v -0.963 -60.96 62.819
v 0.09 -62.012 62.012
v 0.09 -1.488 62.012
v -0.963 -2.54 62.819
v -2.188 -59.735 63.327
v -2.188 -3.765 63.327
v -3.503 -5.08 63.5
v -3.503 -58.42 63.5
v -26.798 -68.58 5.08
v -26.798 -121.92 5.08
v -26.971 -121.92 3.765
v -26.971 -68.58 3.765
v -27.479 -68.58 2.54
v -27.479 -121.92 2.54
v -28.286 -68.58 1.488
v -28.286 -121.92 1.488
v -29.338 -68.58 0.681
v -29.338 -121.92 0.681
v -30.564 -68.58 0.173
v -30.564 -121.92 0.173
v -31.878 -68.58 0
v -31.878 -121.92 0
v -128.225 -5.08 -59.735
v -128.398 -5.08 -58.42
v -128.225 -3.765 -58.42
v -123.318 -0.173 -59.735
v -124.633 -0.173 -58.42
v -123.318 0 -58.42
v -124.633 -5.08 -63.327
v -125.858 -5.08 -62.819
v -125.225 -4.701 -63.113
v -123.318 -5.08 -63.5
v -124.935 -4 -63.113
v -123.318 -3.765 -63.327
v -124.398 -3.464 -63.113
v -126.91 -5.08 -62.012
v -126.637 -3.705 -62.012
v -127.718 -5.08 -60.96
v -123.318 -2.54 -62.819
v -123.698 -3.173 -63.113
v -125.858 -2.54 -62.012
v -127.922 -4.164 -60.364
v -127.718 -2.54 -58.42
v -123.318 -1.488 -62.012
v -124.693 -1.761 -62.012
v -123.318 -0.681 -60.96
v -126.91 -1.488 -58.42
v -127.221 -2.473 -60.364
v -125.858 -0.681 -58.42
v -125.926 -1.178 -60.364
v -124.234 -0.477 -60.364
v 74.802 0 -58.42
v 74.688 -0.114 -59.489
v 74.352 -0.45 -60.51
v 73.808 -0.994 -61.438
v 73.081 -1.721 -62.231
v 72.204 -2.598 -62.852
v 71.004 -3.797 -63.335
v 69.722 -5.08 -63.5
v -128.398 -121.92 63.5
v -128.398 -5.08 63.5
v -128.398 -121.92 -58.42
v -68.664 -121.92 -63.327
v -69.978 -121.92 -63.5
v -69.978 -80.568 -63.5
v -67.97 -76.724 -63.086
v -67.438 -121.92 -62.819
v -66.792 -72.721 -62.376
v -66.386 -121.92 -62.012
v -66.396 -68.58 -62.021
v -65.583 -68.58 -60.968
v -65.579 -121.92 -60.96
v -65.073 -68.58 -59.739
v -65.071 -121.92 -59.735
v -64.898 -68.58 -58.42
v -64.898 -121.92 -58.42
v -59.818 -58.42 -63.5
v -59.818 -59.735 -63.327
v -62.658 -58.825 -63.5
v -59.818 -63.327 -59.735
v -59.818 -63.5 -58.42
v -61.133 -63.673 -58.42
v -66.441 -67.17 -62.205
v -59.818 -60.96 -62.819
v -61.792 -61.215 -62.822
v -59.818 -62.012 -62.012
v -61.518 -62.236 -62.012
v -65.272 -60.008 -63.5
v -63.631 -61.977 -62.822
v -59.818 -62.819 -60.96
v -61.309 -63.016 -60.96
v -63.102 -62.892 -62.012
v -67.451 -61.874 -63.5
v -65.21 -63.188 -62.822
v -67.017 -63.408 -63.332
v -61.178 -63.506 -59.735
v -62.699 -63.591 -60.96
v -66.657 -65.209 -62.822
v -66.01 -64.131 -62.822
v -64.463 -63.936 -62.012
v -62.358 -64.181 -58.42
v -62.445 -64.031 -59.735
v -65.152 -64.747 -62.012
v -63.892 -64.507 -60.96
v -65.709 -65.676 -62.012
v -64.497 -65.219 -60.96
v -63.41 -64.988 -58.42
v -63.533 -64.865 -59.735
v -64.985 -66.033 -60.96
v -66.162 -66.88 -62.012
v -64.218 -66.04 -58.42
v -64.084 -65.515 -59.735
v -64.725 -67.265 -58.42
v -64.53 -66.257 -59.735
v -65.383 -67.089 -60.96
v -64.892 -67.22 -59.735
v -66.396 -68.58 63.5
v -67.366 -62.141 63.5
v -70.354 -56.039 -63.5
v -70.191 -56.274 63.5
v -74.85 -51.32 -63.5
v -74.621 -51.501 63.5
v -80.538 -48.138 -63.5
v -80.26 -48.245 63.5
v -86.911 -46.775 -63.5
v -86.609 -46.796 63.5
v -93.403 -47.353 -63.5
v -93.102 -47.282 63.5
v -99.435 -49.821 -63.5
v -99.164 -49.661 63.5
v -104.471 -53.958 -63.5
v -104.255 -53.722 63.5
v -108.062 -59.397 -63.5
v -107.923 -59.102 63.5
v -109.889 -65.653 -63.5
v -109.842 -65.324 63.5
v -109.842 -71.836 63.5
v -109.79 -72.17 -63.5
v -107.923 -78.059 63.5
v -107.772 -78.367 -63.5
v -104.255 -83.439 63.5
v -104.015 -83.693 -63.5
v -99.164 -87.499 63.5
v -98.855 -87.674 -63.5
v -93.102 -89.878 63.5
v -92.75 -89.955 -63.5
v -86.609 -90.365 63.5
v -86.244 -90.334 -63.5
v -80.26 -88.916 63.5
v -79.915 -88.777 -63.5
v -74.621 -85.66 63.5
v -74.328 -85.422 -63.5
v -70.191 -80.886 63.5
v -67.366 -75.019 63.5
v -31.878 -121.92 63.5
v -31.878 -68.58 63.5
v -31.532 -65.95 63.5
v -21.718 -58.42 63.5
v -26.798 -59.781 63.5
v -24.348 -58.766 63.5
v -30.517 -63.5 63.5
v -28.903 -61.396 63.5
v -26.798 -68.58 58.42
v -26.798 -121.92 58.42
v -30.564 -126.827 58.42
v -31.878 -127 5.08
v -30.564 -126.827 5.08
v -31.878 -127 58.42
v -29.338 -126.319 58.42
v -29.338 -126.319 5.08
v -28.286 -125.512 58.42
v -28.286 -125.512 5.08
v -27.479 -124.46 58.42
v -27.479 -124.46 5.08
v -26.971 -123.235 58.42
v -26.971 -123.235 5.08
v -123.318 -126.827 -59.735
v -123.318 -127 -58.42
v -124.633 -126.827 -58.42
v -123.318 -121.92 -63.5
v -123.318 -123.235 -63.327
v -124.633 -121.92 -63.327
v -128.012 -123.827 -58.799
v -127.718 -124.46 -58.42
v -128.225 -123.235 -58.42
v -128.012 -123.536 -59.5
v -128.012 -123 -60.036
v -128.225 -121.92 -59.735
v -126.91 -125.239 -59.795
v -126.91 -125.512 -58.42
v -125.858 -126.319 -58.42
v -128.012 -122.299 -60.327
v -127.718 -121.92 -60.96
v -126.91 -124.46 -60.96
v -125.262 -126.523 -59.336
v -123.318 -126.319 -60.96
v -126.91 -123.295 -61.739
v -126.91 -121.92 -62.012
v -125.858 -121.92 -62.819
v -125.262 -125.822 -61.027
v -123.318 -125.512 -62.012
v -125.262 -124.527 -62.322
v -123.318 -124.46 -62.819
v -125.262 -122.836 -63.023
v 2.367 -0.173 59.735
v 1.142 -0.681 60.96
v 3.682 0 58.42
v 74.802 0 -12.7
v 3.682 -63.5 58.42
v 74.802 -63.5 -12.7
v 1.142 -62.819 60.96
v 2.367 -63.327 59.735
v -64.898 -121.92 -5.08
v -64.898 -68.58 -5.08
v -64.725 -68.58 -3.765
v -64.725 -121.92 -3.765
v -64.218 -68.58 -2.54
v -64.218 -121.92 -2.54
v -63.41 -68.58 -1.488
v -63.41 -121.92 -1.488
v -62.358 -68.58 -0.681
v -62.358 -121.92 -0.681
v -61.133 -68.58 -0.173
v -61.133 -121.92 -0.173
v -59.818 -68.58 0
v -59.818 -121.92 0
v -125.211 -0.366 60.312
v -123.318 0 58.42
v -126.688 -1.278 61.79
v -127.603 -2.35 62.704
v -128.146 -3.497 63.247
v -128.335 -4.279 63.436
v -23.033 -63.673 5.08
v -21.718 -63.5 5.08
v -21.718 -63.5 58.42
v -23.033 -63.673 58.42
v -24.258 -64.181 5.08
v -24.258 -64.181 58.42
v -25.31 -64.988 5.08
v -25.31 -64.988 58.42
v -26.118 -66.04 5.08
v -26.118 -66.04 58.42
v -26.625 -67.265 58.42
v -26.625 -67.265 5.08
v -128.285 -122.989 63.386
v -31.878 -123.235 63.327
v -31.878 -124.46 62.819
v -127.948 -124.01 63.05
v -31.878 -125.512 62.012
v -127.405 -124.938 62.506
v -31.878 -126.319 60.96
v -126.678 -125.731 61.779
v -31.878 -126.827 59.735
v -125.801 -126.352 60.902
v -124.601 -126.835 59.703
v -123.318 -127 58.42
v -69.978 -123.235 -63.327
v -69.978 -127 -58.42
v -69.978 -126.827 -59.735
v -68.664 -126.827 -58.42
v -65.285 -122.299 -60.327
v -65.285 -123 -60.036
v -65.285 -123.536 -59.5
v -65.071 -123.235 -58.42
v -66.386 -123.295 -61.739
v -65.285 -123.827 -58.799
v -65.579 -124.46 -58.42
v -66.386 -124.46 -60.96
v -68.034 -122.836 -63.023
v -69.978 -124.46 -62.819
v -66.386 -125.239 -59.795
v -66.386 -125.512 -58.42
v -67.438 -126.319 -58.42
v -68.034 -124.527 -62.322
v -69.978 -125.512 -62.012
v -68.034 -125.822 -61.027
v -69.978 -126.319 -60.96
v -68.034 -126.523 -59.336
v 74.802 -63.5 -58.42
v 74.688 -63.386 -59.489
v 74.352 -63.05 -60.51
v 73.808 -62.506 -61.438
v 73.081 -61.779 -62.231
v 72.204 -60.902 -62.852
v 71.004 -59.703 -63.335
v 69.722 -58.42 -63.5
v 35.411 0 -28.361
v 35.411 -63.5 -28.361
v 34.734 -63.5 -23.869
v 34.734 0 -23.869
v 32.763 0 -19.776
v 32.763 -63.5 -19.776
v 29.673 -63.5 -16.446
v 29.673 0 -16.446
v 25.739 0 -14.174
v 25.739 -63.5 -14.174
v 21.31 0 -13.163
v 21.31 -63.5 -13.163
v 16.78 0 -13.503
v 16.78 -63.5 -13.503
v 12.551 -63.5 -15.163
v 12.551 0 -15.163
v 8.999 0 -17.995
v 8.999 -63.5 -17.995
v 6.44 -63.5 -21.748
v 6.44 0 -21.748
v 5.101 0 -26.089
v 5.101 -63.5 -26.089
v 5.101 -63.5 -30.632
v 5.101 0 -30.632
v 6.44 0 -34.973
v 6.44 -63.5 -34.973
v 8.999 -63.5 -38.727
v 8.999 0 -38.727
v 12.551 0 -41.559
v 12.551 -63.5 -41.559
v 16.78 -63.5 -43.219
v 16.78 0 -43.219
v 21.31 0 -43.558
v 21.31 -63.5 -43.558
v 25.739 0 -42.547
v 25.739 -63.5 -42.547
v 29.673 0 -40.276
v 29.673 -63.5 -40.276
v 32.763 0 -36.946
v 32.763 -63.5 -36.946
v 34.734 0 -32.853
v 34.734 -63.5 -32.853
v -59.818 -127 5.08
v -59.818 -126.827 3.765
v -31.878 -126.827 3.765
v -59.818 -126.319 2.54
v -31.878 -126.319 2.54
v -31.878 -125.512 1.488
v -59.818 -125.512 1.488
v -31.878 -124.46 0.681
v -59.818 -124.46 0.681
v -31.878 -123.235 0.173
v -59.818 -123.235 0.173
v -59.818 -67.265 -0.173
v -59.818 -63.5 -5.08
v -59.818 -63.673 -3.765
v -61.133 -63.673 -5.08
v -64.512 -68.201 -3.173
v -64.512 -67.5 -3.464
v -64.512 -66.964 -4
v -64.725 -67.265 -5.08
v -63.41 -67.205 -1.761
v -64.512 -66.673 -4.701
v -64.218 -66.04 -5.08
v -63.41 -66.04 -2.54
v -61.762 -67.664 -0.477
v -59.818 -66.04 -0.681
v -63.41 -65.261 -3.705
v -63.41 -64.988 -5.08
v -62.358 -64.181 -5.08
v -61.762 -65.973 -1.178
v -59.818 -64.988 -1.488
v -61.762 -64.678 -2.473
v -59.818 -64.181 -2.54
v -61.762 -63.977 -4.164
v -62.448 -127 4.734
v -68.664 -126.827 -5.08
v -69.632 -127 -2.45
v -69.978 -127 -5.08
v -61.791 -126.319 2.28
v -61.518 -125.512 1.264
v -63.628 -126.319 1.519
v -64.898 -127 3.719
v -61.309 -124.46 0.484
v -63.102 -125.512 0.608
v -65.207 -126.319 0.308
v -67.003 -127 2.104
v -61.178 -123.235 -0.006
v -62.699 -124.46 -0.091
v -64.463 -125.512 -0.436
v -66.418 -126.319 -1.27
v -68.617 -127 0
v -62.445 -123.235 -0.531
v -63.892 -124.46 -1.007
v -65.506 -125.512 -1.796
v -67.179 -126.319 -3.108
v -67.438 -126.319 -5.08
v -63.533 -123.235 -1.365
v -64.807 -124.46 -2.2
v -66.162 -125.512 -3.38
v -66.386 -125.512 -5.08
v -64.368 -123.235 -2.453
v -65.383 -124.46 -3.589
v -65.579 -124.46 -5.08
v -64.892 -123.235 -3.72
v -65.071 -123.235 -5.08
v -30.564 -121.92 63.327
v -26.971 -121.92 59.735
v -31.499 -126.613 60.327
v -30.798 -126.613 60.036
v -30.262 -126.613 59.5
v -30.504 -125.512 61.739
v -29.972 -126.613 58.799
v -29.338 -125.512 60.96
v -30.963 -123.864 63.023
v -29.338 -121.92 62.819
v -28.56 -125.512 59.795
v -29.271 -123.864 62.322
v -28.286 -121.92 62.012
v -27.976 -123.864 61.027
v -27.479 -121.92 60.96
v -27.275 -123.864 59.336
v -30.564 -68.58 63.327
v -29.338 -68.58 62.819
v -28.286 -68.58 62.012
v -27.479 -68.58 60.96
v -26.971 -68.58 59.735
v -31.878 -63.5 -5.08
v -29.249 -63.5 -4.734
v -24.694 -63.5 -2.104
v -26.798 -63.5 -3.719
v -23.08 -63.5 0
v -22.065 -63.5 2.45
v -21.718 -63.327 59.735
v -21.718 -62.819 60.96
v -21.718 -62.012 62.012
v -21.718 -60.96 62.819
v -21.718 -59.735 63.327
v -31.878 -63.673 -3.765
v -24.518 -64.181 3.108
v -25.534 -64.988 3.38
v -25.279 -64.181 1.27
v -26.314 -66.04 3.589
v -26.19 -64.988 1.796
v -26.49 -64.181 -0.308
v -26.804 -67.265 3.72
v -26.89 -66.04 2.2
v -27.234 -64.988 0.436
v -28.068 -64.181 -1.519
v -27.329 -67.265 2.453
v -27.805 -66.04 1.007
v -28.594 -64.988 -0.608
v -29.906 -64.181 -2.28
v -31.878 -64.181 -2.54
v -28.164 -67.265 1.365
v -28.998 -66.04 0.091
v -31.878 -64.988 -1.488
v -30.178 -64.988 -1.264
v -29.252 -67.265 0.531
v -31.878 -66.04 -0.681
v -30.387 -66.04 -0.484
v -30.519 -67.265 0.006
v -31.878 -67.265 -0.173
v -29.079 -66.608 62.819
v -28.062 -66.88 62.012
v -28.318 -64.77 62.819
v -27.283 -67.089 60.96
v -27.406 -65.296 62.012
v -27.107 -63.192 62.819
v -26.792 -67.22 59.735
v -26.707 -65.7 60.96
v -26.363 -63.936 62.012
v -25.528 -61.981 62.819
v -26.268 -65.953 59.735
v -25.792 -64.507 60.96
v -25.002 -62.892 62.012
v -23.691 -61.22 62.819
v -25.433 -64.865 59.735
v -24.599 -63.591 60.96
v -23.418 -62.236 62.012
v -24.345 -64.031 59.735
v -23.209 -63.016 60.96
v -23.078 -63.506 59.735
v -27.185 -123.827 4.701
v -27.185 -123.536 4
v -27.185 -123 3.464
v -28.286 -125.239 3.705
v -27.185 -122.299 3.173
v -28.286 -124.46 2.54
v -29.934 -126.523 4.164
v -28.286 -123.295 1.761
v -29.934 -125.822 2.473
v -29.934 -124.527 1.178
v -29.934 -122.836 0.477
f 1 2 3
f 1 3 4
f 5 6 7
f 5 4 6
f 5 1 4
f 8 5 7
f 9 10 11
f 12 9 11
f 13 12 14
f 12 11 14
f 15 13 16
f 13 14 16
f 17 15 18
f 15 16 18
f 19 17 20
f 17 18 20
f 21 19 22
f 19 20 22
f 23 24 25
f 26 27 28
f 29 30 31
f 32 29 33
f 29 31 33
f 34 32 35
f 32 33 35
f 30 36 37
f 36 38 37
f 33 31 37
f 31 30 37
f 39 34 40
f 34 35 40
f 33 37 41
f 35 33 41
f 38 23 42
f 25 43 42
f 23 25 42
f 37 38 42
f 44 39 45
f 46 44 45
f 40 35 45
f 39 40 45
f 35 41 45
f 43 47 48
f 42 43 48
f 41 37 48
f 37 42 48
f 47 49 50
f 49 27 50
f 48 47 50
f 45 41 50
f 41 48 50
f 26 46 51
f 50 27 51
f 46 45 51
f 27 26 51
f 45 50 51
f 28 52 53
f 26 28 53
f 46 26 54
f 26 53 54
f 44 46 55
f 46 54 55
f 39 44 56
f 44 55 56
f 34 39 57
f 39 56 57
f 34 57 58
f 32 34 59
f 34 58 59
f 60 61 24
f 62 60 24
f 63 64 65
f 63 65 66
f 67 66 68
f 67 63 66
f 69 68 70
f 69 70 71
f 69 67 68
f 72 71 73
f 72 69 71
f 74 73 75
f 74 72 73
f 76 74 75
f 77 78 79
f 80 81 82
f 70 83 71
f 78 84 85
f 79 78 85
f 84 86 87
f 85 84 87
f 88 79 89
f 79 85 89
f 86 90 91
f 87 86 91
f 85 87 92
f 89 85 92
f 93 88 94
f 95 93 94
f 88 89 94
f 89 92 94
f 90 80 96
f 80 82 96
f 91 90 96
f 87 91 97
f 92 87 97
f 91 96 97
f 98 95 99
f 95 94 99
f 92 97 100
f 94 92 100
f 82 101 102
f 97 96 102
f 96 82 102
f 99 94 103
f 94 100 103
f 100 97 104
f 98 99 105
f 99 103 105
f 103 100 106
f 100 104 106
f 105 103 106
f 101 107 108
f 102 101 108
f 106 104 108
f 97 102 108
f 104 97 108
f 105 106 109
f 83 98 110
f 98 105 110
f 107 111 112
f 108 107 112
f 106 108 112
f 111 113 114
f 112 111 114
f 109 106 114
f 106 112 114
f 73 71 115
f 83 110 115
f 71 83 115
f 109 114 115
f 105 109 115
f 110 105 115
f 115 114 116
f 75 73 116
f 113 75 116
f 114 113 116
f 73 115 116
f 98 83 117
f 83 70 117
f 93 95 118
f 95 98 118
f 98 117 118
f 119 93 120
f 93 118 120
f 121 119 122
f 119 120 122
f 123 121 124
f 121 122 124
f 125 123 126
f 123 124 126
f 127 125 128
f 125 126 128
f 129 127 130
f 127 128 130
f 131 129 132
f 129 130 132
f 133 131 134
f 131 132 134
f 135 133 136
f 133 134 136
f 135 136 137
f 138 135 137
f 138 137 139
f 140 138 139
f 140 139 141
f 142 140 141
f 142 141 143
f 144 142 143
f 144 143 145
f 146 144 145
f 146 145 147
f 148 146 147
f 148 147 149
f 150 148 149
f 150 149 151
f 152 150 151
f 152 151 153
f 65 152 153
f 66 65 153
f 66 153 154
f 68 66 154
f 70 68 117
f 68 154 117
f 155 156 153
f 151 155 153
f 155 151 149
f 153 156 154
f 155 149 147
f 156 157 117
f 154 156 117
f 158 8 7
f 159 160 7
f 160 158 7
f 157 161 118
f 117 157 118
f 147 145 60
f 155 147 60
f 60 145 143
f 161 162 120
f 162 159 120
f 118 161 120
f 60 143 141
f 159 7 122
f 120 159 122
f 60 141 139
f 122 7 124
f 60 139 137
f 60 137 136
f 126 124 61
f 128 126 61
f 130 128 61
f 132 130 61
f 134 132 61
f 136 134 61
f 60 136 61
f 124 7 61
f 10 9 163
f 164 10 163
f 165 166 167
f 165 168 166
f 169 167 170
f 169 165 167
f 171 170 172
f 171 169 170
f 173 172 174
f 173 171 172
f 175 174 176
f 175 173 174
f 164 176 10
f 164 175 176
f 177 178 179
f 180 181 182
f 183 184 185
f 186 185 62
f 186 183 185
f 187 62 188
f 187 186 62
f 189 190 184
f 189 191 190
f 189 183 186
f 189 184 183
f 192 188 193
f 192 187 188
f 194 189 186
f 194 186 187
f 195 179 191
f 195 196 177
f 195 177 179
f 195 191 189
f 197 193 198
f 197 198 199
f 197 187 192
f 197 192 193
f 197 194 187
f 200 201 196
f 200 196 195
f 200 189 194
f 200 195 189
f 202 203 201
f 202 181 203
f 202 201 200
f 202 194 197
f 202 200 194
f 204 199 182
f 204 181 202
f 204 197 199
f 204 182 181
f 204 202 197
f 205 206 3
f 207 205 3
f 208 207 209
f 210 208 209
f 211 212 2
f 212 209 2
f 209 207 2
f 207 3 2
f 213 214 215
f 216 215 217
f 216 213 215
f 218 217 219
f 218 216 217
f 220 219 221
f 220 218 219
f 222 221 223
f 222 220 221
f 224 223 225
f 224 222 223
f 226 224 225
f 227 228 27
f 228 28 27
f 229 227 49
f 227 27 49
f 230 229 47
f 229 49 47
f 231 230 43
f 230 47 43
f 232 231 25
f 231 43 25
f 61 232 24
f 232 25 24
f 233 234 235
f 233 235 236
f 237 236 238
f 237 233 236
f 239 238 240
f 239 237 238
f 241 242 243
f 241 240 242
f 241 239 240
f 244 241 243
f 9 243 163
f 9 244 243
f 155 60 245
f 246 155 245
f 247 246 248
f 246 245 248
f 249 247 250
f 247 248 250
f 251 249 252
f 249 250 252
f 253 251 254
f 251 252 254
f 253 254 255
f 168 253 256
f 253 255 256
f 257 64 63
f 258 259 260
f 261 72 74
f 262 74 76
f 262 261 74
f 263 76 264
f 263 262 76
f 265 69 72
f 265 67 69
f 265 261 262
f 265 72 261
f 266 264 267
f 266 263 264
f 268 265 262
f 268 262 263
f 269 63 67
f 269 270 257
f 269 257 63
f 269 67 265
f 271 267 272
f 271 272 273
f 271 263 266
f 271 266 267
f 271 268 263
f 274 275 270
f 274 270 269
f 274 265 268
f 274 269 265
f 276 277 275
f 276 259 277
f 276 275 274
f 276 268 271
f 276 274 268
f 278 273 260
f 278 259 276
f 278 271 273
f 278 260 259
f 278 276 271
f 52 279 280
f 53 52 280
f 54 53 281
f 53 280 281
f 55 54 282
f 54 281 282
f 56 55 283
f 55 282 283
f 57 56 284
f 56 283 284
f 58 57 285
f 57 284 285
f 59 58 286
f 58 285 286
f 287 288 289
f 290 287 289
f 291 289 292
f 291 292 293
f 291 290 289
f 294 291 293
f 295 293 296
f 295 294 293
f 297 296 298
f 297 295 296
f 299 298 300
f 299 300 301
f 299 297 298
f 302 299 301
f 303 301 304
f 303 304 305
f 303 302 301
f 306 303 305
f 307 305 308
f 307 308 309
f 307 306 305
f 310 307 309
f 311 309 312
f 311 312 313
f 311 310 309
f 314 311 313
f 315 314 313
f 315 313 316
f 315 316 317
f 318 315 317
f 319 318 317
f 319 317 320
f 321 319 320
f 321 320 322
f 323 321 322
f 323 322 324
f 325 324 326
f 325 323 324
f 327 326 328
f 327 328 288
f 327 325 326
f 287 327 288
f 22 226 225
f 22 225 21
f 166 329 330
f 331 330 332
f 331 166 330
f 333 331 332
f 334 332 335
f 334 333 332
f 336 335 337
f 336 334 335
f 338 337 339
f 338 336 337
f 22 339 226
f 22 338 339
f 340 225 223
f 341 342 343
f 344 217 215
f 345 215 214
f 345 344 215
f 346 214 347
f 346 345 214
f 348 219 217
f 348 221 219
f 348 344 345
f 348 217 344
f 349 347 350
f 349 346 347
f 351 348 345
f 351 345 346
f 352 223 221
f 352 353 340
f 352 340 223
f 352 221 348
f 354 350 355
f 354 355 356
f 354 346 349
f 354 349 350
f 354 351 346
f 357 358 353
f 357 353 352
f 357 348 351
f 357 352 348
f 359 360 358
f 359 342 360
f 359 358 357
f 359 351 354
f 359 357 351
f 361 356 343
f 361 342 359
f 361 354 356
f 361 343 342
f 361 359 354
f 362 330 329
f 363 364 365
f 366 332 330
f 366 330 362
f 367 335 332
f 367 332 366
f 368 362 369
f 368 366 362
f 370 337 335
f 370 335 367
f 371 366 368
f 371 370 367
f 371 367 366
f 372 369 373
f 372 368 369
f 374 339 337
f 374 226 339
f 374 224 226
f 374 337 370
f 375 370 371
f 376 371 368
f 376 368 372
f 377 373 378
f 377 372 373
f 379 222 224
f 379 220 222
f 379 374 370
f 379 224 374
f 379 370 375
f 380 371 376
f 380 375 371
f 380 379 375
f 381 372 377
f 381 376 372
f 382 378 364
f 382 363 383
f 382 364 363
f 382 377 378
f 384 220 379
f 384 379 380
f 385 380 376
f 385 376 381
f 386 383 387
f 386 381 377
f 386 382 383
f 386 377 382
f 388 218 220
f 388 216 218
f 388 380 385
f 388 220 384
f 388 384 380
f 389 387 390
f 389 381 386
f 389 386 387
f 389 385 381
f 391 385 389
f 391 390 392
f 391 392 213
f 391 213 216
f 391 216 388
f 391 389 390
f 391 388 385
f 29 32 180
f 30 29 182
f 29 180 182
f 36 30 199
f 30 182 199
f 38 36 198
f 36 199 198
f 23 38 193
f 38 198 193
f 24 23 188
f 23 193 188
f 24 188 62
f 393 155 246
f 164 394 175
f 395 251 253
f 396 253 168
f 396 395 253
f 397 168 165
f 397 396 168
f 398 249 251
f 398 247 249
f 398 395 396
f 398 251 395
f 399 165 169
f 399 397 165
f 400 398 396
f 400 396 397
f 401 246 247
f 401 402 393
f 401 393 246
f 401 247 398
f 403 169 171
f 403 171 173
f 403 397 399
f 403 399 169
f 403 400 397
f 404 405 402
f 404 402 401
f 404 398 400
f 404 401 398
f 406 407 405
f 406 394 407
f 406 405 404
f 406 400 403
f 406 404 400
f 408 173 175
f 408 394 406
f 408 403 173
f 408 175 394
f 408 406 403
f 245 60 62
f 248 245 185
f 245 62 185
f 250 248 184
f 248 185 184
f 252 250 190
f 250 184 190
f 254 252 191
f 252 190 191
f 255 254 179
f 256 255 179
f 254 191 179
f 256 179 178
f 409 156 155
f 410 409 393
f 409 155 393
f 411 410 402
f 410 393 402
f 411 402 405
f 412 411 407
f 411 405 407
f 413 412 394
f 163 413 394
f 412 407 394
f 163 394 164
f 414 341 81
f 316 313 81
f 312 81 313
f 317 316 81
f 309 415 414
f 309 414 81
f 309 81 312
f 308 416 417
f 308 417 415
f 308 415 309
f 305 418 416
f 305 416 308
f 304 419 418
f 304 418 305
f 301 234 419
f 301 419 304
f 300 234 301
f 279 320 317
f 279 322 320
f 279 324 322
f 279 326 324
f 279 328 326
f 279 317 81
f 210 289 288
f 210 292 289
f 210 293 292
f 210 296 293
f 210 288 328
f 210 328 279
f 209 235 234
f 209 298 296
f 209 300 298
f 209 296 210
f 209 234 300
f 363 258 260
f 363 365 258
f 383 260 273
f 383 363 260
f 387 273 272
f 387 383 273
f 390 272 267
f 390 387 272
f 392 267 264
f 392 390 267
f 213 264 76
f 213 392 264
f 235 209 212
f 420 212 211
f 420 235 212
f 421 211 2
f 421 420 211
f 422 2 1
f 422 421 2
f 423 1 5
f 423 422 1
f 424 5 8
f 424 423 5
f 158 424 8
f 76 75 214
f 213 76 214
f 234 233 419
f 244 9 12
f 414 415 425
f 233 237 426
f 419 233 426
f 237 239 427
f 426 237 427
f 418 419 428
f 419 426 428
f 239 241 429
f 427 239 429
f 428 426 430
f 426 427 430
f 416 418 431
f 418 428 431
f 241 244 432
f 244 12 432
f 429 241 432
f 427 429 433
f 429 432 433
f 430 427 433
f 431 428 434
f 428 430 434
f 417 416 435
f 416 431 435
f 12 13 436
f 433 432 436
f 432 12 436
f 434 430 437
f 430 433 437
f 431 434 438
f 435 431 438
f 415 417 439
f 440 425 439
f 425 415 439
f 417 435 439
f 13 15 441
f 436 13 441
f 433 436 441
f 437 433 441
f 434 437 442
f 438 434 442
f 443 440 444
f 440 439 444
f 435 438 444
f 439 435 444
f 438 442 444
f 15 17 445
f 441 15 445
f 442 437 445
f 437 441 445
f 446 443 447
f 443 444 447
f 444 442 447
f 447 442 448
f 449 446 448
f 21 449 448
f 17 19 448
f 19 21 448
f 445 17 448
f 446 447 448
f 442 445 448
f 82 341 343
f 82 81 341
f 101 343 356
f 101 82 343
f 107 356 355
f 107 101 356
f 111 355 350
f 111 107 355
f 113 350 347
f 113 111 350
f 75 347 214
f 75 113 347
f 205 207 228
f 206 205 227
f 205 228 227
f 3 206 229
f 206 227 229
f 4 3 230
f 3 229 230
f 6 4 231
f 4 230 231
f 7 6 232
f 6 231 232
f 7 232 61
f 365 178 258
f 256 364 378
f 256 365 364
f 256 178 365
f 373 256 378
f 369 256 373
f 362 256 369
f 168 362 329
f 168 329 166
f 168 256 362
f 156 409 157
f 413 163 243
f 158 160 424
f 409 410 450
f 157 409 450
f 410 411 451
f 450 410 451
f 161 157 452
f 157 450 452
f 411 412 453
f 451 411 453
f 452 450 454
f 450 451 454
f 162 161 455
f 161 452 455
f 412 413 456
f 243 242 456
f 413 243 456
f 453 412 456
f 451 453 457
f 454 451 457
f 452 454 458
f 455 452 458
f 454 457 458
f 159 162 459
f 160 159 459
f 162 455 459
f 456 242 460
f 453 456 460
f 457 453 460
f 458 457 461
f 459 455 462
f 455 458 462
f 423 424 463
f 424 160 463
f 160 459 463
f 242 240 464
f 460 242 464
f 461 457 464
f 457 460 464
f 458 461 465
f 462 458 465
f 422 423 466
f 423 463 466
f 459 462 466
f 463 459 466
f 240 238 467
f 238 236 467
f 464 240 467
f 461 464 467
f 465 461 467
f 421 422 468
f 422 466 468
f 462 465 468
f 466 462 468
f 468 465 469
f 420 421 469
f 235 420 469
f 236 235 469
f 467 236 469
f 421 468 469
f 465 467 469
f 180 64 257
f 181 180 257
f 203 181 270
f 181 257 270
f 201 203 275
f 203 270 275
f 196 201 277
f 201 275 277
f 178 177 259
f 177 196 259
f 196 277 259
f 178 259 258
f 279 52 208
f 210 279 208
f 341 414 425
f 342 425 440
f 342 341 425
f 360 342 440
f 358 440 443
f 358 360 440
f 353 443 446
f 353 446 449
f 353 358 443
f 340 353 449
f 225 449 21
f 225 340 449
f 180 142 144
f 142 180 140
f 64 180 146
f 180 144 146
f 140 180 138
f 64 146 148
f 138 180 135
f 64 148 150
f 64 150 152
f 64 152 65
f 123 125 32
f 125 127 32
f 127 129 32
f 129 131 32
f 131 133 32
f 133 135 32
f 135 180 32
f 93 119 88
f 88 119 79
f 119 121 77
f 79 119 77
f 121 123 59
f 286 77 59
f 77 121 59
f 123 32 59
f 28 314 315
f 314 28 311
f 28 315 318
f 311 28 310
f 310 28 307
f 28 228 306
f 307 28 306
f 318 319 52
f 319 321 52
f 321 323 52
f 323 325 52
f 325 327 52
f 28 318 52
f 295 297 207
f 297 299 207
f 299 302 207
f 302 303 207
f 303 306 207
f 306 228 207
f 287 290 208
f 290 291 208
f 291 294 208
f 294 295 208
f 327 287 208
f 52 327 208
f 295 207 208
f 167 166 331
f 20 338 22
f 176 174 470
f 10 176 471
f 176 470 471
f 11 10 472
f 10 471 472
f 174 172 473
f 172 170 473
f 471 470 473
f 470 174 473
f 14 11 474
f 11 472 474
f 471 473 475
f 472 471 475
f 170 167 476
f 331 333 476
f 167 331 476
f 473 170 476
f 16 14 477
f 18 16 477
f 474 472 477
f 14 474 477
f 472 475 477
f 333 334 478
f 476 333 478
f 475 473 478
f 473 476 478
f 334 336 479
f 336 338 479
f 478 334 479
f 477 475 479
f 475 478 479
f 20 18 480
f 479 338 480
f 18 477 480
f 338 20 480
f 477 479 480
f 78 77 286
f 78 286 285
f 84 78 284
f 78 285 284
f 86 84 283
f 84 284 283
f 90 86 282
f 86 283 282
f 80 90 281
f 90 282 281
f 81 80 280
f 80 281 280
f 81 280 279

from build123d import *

# Parameters (mm, degrees)
F1_DEPTH = 127
F0_R     = 15.24
F2_DEPTH = 63.5
F3_SIZE  = 76.2
F4_R     = 5.08
F5_R     = 21.8454562642
F6_DEPTH = 228.6


with BuildPart() as f1:
    # F0 (on Front) → F1 (new body)
    with BuildSketch(Plane.XZ):
        Polygon((-26.7983935773, 0), (-26.7983935773, 63.5), (-128.3983935773, 63.5), (-128.3983935773, -63.5), (-64.8983935773, -63.5), (-64.8983935773, 0), align=None)
    extrude(amount=F1_DEPTH)

    # F0 (on Front) → F2 (join)
    with BuildSketch(Plane.XZ):
        Polygon((74.8016064227, -63.5), (74.8016064227, 63.5), (-26.7983935773, 63.5), (-26.7983935773, 0), (-64.8983935773, 0), (-64.8983935773, -63.5), align=None)
        with Locations((20.1709009707, -28.3607393503)):
            Circle(F0_R, mode=Mode.SUBTRACT)
    extrude(amount=F2_DEPTH)

    # F3
    f3_edges = [f1.edges().sort_by_distance(p)[0] for p in [
        (74.801606, -31.75, 63.5),
    ]]
    chamfer(f3_edges, length=F3_SIZE)

    # F4
    f4_edges = [f1.edges().sort_by_distance(p)[0] for p in [
        (-1.398394, -31.75, 63.5),
        (-128.398394, 0, 0),
        (-26.798394, -63.5, 31.75),
        (-45.848394, -63.5, 0),
        (-64.898394, -95.25, 0),
        (-26.798394, -95.25, 63.5),
        (-14.098394, -63.5, 63.5),
        (-64.898394, 0, 63.5),
        (-96.648394, -127, -63.5),
        (-128.398394, -127, 0),
        (-77.598394, -127, 63.5),
        (-64.898394, -95.25, -63.5),
        (-45.848394, -127, 0),
        (-64.898394, -127, -31.75),
        (-64.898394, -63.5, -31.75),
        (-128.398394, -63.5, -63.5),
        (-26.798394, -127, 31.75),
        (-26.798394, -95.25, 0),
        (74.801606, -31.75, -63.5),
        (-26.798394, 0, -63.5),
        (4.951606, -63.5, -63.5),
    ]]
    fillet(f4_edges, radius=F4_R)

    # F5 (on face) → F6 (cut)
    with BuildSketch(Plane.XY.offset(63.5)):
        with Locations((-88.2410332561, -68.5802102089)):
            Circle(F5_R)
    extrude(amount=-F6_DEPTH, mode=Mode.SUBTRACT)


solid = f1.part
